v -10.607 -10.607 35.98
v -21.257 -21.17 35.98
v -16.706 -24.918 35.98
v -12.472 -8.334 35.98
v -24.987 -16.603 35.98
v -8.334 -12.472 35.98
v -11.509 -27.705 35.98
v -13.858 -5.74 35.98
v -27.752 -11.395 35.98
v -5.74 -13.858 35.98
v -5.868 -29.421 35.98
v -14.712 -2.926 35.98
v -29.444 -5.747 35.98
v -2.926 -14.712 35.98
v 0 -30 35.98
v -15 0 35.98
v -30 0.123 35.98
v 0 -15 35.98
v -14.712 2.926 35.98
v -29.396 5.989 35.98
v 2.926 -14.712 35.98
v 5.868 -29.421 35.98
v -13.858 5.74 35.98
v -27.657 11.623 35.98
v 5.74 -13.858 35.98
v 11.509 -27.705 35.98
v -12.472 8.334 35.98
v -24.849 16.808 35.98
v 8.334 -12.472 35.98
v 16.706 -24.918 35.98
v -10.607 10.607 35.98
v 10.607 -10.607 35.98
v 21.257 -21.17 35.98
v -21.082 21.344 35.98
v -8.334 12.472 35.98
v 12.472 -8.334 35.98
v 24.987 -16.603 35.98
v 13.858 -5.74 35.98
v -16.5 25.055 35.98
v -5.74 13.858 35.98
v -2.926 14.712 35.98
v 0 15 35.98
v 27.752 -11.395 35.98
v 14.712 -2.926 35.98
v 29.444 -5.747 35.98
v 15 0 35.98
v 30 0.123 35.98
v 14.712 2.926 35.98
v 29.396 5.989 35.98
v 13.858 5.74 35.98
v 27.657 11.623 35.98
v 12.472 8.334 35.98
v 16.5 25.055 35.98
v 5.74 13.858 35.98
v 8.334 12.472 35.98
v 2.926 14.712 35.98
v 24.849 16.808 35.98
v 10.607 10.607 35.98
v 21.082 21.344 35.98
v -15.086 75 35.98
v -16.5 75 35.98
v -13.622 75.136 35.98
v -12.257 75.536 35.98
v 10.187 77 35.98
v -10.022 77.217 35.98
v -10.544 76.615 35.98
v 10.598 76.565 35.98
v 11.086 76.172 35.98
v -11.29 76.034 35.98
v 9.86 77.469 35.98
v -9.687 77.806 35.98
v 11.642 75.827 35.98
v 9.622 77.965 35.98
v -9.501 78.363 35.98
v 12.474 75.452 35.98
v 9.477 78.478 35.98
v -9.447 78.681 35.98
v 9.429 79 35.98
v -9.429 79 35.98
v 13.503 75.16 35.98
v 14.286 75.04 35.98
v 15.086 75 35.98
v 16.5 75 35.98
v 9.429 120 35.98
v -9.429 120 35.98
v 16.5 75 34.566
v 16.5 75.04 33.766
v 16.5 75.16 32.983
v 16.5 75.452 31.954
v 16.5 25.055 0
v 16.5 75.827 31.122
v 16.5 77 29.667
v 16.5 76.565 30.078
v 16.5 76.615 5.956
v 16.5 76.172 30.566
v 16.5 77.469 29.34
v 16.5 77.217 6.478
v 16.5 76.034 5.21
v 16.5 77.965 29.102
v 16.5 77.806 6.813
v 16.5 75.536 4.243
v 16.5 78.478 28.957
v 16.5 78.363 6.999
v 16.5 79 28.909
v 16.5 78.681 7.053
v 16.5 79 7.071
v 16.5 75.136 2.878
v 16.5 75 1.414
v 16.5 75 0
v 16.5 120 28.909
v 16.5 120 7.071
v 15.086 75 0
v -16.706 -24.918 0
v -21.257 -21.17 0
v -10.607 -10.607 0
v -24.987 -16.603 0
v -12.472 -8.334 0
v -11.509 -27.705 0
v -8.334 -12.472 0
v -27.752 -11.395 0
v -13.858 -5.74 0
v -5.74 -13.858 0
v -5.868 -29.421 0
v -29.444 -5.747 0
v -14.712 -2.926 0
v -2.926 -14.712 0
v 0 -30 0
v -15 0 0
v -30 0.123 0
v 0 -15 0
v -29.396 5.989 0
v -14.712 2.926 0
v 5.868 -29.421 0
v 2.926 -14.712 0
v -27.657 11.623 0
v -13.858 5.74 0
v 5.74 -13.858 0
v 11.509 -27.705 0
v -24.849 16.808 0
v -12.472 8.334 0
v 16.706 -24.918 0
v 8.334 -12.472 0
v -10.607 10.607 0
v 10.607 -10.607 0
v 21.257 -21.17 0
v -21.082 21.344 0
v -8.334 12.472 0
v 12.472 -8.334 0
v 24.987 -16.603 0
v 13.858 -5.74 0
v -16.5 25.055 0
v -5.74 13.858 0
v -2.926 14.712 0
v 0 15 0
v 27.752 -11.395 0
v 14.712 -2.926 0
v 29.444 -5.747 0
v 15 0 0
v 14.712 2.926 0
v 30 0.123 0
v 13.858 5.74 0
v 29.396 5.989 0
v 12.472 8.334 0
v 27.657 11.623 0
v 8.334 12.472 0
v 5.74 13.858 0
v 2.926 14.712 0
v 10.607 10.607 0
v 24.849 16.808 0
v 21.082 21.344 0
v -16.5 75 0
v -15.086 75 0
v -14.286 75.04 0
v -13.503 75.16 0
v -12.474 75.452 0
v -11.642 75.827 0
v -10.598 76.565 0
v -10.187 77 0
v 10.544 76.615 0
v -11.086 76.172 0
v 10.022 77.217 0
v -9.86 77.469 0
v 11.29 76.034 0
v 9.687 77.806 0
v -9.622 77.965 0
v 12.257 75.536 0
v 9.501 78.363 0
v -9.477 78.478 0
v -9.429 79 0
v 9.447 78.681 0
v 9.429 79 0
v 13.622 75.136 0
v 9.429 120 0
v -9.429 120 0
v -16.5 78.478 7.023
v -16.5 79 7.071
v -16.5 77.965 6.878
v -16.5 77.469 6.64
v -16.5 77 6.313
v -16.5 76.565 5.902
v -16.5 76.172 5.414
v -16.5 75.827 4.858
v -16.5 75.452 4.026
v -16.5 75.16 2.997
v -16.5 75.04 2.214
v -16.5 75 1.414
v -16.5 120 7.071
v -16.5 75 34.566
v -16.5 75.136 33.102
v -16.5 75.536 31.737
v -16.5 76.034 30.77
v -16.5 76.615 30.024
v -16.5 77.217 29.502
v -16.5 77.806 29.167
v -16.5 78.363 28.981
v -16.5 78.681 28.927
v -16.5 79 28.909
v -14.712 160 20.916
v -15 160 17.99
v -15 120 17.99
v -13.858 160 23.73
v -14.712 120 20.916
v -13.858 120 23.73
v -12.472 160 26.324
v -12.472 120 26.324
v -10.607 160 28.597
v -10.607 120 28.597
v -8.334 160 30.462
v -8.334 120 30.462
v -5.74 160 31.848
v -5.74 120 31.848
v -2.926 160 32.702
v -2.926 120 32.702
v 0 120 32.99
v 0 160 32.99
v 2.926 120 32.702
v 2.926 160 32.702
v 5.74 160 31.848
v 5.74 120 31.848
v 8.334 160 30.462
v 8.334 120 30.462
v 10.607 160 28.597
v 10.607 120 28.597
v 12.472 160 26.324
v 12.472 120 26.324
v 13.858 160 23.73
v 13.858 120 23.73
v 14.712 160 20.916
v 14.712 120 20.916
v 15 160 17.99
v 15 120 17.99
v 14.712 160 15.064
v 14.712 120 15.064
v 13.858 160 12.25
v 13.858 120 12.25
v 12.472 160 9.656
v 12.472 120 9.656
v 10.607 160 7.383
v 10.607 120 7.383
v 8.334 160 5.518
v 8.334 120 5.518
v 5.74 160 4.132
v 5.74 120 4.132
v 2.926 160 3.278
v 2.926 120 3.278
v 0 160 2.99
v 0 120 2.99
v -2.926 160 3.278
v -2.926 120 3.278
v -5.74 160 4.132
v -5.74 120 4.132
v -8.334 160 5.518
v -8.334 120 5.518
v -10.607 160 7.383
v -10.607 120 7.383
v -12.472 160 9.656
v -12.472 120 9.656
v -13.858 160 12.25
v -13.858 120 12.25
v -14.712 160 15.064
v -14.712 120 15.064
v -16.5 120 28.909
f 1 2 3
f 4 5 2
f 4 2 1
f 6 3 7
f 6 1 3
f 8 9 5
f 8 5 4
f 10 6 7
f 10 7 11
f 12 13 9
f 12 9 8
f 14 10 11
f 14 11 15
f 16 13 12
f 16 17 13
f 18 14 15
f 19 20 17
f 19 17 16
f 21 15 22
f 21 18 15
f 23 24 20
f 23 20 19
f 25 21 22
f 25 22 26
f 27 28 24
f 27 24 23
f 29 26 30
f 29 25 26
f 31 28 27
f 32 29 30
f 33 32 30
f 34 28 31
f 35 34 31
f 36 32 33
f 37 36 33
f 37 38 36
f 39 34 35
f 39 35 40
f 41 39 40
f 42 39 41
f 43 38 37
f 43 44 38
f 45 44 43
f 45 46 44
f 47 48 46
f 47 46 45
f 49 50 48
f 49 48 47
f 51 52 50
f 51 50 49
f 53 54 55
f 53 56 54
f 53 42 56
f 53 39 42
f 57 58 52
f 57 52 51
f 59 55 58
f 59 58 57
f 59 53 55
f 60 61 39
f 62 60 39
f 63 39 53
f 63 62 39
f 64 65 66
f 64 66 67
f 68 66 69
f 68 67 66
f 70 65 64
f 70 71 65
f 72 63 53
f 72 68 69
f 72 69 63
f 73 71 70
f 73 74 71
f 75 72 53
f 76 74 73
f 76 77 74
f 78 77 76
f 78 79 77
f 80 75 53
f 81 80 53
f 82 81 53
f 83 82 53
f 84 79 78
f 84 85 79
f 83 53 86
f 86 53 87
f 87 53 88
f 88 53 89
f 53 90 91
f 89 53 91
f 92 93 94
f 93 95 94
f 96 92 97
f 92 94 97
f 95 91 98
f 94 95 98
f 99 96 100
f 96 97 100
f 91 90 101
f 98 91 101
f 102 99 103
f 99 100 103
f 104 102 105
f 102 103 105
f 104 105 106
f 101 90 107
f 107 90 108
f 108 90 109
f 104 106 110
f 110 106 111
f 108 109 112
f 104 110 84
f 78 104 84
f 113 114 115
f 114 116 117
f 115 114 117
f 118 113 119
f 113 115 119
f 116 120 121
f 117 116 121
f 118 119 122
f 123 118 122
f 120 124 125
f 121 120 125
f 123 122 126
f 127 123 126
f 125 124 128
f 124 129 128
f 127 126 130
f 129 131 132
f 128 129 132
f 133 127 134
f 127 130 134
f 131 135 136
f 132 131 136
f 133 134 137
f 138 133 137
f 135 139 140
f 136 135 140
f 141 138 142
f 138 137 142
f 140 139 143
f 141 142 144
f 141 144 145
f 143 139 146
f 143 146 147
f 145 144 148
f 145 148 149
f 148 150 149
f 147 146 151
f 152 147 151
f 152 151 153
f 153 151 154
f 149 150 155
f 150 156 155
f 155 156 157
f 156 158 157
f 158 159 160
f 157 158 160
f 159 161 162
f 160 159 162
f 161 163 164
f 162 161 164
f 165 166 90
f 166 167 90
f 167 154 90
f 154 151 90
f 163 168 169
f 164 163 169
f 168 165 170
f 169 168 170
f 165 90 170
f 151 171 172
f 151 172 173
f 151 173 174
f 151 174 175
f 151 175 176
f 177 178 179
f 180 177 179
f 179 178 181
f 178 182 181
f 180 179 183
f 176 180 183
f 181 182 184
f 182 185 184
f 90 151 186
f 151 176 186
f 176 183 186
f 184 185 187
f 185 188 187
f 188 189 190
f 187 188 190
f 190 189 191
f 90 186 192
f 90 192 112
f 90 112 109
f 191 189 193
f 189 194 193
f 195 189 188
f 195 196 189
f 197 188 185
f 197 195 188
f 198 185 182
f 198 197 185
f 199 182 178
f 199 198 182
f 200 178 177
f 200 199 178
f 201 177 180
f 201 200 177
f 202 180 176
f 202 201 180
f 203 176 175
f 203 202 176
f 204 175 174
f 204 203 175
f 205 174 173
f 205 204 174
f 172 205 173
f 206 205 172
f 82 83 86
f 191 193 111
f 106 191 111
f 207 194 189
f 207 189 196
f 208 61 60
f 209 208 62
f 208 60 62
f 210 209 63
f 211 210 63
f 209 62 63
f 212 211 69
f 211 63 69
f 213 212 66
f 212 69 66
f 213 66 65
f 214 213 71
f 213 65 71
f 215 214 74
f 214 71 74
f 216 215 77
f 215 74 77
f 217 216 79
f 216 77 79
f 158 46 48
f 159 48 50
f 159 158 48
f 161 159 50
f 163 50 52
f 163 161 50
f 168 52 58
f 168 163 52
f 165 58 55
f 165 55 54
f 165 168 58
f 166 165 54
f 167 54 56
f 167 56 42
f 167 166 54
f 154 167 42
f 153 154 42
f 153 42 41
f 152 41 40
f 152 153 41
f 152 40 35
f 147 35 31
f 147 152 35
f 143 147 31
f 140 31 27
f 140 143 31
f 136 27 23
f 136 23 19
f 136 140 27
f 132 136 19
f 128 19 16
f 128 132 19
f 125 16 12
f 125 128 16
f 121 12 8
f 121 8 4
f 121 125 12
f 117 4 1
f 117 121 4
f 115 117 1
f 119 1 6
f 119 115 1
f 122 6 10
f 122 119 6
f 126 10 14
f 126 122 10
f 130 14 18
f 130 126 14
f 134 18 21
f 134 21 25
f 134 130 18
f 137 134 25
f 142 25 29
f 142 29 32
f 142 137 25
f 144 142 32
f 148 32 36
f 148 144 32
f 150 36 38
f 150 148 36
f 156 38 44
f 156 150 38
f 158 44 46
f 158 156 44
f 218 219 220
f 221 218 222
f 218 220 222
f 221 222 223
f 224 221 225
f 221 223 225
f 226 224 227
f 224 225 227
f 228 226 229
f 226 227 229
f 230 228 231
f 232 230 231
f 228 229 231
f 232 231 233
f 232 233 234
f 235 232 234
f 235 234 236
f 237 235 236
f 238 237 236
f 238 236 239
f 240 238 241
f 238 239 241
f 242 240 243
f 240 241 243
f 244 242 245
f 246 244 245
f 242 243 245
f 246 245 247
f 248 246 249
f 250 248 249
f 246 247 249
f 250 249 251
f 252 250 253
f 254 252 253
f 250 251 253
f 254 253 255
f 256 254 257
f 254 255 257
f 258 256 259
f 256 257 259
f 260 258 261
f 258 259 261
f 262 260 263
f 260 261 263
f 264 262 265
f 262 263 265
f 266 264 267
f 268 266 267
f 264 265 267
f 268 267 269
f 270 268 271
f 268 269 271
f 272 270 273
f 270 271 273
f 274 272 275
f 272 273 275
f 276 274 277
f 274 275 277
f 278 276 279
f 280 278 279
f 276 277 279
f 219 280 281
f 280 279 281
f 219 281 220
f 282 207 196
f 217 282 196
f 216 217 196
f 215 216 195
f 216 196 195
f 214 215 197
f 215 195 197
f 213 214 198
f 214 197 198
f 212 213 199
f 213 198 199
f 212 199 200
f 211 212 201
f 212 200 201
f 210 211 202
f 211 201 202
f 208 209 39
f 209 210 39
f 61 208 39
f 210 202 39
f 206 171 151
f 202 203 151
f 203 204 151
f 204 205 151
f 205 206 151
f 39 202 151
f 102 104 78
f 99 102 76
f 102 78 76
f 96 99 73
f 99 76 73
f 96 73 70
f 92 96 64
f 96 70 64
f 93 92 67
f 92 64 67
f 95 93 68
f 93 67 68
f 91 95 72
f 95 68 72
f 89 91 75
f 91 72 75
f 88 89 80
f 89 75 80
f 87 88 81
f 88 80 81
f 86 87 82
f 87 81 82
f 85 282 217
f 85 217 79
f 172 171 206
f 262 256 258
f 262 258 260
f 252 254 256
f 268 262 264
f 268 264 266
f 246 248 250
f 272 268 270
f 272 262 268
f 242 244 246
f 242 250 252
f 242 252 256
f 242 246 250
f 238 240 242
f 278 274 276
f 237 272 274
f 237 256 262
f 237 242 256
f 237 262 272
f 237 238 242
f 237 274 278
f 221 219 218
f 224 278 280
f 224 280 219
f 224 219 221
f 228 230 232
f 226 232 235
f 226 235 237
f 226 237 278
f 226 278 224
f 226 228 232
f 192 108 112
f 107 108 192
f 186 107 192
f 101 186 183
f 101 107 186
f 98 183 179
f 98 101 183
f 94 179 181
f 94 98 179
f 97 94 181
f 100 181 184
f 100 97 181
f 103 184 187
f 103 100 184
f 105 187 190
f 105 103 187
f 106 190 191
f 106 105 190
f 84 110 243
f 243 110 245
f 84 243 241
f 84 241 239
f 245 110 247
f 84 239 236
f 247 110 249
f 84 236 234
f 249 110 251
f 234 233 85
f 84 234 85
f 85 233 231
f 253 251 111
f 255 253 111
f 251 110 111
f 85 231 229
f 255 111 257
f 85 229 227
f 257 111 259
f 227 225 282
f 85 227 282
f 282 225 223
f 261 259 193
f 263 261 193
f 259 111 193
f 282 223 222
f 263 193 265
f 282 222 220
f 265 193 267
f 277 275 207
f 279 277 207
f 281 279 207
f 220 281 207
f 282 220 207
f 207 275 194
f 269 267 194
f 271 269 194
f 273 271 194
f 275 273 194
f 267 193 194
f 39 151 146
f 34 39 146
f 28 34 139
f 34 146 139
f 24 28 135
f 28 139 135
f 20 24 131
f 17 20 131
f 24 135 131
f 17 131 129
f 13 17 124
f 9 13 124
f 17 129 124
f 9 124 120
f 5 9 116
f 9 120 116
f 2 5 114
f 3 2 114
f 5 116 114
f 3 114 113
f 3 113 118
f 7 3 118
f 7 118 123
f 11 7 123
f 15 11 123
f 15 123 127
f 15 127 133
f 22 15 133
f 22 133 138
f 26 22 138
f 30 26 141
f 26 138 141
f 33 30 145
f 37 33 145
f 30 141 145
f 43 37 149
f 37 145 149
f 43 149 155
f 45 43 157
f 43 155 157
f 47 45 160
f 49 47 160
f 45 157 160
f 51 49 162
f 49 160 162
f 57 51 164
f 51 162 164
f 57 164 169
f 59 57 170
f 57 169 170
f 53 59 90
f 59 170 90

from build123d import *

# Parameters (mm, degrees)
SKETCH_R     = 15
PAD_DEPTH    = 35.98
SKETCH001_R  = 15
PAD001_DEPTH = 40
POCKET_DEPTH = 45
FILLET_R     = 4


with BuildPart() as part:
    # Sketch → Pad (new body)
    with BuildSketch(Plane.XY):
        with BuildLine():
            ThreePointArc((-16.5, 25.05494), (0, -30), (16.5, 25.05494))
            Line((16.5, 25.05494), (16.5, 120))
            Line((16.5, 120), (-16.5, 120))
            Line((-16.5, 120), (-16.5, 25.05494))
        make_face()
        Circle(SKETCH_R, mode=Mode.SUBTRACT)
    extrude(amount=PAD_DEPTH)

    # Sketch001 (on Face3 of Pad) → Pad001 (join)
    with BuildSketch(Plane(origin=(0, 120, 0), x_dir=(-1, 0, 0), z_dir=(0, 1, 0))):
        with Locations((0, 17.99)):
            Circle(SKETCH001_R)
    extrude(amount=PAD001_DEPTH)

    # Sketch002 (on Face6 of Pad001) → Pocket (cut)
    with BuildSketch(Plane(origin=(0, 120, 0), x_dir=(-1, 0, 0), z_dir=(0, 1, 0))):
        Polygon((-16.5, 35.98), (-16.5, 28.908932), (-9.428932, 35.98), align=None)
        Polygon((16.5, 35.98), (16.5, 28.908932), (9.428932, 35.98), align=None)
        Polygon((16.5, 0), (9.428932, 0), (16.5, 7.071068), align=None)
        Polygon((-16.5, 0), (-9.428932, 0), (-16.5, 7.071068), align=None)
    extrude(amount=-POCKET_DEPTH, mode=Mode.SUBTRACT)

    # Fillet
    fillet_edges = [part.edges().sort_by_distance(p)[0] for p in [
        (-12.964466, 75, 3.535534),
        (-12.964466, 75, 32.444466),
        (12.964466, 75, 32.444466),
        (12.964466, 75, 3.535534),
    ]]
    fillet(fillet_edges, radius=FILLET_R)


solid = part.part
